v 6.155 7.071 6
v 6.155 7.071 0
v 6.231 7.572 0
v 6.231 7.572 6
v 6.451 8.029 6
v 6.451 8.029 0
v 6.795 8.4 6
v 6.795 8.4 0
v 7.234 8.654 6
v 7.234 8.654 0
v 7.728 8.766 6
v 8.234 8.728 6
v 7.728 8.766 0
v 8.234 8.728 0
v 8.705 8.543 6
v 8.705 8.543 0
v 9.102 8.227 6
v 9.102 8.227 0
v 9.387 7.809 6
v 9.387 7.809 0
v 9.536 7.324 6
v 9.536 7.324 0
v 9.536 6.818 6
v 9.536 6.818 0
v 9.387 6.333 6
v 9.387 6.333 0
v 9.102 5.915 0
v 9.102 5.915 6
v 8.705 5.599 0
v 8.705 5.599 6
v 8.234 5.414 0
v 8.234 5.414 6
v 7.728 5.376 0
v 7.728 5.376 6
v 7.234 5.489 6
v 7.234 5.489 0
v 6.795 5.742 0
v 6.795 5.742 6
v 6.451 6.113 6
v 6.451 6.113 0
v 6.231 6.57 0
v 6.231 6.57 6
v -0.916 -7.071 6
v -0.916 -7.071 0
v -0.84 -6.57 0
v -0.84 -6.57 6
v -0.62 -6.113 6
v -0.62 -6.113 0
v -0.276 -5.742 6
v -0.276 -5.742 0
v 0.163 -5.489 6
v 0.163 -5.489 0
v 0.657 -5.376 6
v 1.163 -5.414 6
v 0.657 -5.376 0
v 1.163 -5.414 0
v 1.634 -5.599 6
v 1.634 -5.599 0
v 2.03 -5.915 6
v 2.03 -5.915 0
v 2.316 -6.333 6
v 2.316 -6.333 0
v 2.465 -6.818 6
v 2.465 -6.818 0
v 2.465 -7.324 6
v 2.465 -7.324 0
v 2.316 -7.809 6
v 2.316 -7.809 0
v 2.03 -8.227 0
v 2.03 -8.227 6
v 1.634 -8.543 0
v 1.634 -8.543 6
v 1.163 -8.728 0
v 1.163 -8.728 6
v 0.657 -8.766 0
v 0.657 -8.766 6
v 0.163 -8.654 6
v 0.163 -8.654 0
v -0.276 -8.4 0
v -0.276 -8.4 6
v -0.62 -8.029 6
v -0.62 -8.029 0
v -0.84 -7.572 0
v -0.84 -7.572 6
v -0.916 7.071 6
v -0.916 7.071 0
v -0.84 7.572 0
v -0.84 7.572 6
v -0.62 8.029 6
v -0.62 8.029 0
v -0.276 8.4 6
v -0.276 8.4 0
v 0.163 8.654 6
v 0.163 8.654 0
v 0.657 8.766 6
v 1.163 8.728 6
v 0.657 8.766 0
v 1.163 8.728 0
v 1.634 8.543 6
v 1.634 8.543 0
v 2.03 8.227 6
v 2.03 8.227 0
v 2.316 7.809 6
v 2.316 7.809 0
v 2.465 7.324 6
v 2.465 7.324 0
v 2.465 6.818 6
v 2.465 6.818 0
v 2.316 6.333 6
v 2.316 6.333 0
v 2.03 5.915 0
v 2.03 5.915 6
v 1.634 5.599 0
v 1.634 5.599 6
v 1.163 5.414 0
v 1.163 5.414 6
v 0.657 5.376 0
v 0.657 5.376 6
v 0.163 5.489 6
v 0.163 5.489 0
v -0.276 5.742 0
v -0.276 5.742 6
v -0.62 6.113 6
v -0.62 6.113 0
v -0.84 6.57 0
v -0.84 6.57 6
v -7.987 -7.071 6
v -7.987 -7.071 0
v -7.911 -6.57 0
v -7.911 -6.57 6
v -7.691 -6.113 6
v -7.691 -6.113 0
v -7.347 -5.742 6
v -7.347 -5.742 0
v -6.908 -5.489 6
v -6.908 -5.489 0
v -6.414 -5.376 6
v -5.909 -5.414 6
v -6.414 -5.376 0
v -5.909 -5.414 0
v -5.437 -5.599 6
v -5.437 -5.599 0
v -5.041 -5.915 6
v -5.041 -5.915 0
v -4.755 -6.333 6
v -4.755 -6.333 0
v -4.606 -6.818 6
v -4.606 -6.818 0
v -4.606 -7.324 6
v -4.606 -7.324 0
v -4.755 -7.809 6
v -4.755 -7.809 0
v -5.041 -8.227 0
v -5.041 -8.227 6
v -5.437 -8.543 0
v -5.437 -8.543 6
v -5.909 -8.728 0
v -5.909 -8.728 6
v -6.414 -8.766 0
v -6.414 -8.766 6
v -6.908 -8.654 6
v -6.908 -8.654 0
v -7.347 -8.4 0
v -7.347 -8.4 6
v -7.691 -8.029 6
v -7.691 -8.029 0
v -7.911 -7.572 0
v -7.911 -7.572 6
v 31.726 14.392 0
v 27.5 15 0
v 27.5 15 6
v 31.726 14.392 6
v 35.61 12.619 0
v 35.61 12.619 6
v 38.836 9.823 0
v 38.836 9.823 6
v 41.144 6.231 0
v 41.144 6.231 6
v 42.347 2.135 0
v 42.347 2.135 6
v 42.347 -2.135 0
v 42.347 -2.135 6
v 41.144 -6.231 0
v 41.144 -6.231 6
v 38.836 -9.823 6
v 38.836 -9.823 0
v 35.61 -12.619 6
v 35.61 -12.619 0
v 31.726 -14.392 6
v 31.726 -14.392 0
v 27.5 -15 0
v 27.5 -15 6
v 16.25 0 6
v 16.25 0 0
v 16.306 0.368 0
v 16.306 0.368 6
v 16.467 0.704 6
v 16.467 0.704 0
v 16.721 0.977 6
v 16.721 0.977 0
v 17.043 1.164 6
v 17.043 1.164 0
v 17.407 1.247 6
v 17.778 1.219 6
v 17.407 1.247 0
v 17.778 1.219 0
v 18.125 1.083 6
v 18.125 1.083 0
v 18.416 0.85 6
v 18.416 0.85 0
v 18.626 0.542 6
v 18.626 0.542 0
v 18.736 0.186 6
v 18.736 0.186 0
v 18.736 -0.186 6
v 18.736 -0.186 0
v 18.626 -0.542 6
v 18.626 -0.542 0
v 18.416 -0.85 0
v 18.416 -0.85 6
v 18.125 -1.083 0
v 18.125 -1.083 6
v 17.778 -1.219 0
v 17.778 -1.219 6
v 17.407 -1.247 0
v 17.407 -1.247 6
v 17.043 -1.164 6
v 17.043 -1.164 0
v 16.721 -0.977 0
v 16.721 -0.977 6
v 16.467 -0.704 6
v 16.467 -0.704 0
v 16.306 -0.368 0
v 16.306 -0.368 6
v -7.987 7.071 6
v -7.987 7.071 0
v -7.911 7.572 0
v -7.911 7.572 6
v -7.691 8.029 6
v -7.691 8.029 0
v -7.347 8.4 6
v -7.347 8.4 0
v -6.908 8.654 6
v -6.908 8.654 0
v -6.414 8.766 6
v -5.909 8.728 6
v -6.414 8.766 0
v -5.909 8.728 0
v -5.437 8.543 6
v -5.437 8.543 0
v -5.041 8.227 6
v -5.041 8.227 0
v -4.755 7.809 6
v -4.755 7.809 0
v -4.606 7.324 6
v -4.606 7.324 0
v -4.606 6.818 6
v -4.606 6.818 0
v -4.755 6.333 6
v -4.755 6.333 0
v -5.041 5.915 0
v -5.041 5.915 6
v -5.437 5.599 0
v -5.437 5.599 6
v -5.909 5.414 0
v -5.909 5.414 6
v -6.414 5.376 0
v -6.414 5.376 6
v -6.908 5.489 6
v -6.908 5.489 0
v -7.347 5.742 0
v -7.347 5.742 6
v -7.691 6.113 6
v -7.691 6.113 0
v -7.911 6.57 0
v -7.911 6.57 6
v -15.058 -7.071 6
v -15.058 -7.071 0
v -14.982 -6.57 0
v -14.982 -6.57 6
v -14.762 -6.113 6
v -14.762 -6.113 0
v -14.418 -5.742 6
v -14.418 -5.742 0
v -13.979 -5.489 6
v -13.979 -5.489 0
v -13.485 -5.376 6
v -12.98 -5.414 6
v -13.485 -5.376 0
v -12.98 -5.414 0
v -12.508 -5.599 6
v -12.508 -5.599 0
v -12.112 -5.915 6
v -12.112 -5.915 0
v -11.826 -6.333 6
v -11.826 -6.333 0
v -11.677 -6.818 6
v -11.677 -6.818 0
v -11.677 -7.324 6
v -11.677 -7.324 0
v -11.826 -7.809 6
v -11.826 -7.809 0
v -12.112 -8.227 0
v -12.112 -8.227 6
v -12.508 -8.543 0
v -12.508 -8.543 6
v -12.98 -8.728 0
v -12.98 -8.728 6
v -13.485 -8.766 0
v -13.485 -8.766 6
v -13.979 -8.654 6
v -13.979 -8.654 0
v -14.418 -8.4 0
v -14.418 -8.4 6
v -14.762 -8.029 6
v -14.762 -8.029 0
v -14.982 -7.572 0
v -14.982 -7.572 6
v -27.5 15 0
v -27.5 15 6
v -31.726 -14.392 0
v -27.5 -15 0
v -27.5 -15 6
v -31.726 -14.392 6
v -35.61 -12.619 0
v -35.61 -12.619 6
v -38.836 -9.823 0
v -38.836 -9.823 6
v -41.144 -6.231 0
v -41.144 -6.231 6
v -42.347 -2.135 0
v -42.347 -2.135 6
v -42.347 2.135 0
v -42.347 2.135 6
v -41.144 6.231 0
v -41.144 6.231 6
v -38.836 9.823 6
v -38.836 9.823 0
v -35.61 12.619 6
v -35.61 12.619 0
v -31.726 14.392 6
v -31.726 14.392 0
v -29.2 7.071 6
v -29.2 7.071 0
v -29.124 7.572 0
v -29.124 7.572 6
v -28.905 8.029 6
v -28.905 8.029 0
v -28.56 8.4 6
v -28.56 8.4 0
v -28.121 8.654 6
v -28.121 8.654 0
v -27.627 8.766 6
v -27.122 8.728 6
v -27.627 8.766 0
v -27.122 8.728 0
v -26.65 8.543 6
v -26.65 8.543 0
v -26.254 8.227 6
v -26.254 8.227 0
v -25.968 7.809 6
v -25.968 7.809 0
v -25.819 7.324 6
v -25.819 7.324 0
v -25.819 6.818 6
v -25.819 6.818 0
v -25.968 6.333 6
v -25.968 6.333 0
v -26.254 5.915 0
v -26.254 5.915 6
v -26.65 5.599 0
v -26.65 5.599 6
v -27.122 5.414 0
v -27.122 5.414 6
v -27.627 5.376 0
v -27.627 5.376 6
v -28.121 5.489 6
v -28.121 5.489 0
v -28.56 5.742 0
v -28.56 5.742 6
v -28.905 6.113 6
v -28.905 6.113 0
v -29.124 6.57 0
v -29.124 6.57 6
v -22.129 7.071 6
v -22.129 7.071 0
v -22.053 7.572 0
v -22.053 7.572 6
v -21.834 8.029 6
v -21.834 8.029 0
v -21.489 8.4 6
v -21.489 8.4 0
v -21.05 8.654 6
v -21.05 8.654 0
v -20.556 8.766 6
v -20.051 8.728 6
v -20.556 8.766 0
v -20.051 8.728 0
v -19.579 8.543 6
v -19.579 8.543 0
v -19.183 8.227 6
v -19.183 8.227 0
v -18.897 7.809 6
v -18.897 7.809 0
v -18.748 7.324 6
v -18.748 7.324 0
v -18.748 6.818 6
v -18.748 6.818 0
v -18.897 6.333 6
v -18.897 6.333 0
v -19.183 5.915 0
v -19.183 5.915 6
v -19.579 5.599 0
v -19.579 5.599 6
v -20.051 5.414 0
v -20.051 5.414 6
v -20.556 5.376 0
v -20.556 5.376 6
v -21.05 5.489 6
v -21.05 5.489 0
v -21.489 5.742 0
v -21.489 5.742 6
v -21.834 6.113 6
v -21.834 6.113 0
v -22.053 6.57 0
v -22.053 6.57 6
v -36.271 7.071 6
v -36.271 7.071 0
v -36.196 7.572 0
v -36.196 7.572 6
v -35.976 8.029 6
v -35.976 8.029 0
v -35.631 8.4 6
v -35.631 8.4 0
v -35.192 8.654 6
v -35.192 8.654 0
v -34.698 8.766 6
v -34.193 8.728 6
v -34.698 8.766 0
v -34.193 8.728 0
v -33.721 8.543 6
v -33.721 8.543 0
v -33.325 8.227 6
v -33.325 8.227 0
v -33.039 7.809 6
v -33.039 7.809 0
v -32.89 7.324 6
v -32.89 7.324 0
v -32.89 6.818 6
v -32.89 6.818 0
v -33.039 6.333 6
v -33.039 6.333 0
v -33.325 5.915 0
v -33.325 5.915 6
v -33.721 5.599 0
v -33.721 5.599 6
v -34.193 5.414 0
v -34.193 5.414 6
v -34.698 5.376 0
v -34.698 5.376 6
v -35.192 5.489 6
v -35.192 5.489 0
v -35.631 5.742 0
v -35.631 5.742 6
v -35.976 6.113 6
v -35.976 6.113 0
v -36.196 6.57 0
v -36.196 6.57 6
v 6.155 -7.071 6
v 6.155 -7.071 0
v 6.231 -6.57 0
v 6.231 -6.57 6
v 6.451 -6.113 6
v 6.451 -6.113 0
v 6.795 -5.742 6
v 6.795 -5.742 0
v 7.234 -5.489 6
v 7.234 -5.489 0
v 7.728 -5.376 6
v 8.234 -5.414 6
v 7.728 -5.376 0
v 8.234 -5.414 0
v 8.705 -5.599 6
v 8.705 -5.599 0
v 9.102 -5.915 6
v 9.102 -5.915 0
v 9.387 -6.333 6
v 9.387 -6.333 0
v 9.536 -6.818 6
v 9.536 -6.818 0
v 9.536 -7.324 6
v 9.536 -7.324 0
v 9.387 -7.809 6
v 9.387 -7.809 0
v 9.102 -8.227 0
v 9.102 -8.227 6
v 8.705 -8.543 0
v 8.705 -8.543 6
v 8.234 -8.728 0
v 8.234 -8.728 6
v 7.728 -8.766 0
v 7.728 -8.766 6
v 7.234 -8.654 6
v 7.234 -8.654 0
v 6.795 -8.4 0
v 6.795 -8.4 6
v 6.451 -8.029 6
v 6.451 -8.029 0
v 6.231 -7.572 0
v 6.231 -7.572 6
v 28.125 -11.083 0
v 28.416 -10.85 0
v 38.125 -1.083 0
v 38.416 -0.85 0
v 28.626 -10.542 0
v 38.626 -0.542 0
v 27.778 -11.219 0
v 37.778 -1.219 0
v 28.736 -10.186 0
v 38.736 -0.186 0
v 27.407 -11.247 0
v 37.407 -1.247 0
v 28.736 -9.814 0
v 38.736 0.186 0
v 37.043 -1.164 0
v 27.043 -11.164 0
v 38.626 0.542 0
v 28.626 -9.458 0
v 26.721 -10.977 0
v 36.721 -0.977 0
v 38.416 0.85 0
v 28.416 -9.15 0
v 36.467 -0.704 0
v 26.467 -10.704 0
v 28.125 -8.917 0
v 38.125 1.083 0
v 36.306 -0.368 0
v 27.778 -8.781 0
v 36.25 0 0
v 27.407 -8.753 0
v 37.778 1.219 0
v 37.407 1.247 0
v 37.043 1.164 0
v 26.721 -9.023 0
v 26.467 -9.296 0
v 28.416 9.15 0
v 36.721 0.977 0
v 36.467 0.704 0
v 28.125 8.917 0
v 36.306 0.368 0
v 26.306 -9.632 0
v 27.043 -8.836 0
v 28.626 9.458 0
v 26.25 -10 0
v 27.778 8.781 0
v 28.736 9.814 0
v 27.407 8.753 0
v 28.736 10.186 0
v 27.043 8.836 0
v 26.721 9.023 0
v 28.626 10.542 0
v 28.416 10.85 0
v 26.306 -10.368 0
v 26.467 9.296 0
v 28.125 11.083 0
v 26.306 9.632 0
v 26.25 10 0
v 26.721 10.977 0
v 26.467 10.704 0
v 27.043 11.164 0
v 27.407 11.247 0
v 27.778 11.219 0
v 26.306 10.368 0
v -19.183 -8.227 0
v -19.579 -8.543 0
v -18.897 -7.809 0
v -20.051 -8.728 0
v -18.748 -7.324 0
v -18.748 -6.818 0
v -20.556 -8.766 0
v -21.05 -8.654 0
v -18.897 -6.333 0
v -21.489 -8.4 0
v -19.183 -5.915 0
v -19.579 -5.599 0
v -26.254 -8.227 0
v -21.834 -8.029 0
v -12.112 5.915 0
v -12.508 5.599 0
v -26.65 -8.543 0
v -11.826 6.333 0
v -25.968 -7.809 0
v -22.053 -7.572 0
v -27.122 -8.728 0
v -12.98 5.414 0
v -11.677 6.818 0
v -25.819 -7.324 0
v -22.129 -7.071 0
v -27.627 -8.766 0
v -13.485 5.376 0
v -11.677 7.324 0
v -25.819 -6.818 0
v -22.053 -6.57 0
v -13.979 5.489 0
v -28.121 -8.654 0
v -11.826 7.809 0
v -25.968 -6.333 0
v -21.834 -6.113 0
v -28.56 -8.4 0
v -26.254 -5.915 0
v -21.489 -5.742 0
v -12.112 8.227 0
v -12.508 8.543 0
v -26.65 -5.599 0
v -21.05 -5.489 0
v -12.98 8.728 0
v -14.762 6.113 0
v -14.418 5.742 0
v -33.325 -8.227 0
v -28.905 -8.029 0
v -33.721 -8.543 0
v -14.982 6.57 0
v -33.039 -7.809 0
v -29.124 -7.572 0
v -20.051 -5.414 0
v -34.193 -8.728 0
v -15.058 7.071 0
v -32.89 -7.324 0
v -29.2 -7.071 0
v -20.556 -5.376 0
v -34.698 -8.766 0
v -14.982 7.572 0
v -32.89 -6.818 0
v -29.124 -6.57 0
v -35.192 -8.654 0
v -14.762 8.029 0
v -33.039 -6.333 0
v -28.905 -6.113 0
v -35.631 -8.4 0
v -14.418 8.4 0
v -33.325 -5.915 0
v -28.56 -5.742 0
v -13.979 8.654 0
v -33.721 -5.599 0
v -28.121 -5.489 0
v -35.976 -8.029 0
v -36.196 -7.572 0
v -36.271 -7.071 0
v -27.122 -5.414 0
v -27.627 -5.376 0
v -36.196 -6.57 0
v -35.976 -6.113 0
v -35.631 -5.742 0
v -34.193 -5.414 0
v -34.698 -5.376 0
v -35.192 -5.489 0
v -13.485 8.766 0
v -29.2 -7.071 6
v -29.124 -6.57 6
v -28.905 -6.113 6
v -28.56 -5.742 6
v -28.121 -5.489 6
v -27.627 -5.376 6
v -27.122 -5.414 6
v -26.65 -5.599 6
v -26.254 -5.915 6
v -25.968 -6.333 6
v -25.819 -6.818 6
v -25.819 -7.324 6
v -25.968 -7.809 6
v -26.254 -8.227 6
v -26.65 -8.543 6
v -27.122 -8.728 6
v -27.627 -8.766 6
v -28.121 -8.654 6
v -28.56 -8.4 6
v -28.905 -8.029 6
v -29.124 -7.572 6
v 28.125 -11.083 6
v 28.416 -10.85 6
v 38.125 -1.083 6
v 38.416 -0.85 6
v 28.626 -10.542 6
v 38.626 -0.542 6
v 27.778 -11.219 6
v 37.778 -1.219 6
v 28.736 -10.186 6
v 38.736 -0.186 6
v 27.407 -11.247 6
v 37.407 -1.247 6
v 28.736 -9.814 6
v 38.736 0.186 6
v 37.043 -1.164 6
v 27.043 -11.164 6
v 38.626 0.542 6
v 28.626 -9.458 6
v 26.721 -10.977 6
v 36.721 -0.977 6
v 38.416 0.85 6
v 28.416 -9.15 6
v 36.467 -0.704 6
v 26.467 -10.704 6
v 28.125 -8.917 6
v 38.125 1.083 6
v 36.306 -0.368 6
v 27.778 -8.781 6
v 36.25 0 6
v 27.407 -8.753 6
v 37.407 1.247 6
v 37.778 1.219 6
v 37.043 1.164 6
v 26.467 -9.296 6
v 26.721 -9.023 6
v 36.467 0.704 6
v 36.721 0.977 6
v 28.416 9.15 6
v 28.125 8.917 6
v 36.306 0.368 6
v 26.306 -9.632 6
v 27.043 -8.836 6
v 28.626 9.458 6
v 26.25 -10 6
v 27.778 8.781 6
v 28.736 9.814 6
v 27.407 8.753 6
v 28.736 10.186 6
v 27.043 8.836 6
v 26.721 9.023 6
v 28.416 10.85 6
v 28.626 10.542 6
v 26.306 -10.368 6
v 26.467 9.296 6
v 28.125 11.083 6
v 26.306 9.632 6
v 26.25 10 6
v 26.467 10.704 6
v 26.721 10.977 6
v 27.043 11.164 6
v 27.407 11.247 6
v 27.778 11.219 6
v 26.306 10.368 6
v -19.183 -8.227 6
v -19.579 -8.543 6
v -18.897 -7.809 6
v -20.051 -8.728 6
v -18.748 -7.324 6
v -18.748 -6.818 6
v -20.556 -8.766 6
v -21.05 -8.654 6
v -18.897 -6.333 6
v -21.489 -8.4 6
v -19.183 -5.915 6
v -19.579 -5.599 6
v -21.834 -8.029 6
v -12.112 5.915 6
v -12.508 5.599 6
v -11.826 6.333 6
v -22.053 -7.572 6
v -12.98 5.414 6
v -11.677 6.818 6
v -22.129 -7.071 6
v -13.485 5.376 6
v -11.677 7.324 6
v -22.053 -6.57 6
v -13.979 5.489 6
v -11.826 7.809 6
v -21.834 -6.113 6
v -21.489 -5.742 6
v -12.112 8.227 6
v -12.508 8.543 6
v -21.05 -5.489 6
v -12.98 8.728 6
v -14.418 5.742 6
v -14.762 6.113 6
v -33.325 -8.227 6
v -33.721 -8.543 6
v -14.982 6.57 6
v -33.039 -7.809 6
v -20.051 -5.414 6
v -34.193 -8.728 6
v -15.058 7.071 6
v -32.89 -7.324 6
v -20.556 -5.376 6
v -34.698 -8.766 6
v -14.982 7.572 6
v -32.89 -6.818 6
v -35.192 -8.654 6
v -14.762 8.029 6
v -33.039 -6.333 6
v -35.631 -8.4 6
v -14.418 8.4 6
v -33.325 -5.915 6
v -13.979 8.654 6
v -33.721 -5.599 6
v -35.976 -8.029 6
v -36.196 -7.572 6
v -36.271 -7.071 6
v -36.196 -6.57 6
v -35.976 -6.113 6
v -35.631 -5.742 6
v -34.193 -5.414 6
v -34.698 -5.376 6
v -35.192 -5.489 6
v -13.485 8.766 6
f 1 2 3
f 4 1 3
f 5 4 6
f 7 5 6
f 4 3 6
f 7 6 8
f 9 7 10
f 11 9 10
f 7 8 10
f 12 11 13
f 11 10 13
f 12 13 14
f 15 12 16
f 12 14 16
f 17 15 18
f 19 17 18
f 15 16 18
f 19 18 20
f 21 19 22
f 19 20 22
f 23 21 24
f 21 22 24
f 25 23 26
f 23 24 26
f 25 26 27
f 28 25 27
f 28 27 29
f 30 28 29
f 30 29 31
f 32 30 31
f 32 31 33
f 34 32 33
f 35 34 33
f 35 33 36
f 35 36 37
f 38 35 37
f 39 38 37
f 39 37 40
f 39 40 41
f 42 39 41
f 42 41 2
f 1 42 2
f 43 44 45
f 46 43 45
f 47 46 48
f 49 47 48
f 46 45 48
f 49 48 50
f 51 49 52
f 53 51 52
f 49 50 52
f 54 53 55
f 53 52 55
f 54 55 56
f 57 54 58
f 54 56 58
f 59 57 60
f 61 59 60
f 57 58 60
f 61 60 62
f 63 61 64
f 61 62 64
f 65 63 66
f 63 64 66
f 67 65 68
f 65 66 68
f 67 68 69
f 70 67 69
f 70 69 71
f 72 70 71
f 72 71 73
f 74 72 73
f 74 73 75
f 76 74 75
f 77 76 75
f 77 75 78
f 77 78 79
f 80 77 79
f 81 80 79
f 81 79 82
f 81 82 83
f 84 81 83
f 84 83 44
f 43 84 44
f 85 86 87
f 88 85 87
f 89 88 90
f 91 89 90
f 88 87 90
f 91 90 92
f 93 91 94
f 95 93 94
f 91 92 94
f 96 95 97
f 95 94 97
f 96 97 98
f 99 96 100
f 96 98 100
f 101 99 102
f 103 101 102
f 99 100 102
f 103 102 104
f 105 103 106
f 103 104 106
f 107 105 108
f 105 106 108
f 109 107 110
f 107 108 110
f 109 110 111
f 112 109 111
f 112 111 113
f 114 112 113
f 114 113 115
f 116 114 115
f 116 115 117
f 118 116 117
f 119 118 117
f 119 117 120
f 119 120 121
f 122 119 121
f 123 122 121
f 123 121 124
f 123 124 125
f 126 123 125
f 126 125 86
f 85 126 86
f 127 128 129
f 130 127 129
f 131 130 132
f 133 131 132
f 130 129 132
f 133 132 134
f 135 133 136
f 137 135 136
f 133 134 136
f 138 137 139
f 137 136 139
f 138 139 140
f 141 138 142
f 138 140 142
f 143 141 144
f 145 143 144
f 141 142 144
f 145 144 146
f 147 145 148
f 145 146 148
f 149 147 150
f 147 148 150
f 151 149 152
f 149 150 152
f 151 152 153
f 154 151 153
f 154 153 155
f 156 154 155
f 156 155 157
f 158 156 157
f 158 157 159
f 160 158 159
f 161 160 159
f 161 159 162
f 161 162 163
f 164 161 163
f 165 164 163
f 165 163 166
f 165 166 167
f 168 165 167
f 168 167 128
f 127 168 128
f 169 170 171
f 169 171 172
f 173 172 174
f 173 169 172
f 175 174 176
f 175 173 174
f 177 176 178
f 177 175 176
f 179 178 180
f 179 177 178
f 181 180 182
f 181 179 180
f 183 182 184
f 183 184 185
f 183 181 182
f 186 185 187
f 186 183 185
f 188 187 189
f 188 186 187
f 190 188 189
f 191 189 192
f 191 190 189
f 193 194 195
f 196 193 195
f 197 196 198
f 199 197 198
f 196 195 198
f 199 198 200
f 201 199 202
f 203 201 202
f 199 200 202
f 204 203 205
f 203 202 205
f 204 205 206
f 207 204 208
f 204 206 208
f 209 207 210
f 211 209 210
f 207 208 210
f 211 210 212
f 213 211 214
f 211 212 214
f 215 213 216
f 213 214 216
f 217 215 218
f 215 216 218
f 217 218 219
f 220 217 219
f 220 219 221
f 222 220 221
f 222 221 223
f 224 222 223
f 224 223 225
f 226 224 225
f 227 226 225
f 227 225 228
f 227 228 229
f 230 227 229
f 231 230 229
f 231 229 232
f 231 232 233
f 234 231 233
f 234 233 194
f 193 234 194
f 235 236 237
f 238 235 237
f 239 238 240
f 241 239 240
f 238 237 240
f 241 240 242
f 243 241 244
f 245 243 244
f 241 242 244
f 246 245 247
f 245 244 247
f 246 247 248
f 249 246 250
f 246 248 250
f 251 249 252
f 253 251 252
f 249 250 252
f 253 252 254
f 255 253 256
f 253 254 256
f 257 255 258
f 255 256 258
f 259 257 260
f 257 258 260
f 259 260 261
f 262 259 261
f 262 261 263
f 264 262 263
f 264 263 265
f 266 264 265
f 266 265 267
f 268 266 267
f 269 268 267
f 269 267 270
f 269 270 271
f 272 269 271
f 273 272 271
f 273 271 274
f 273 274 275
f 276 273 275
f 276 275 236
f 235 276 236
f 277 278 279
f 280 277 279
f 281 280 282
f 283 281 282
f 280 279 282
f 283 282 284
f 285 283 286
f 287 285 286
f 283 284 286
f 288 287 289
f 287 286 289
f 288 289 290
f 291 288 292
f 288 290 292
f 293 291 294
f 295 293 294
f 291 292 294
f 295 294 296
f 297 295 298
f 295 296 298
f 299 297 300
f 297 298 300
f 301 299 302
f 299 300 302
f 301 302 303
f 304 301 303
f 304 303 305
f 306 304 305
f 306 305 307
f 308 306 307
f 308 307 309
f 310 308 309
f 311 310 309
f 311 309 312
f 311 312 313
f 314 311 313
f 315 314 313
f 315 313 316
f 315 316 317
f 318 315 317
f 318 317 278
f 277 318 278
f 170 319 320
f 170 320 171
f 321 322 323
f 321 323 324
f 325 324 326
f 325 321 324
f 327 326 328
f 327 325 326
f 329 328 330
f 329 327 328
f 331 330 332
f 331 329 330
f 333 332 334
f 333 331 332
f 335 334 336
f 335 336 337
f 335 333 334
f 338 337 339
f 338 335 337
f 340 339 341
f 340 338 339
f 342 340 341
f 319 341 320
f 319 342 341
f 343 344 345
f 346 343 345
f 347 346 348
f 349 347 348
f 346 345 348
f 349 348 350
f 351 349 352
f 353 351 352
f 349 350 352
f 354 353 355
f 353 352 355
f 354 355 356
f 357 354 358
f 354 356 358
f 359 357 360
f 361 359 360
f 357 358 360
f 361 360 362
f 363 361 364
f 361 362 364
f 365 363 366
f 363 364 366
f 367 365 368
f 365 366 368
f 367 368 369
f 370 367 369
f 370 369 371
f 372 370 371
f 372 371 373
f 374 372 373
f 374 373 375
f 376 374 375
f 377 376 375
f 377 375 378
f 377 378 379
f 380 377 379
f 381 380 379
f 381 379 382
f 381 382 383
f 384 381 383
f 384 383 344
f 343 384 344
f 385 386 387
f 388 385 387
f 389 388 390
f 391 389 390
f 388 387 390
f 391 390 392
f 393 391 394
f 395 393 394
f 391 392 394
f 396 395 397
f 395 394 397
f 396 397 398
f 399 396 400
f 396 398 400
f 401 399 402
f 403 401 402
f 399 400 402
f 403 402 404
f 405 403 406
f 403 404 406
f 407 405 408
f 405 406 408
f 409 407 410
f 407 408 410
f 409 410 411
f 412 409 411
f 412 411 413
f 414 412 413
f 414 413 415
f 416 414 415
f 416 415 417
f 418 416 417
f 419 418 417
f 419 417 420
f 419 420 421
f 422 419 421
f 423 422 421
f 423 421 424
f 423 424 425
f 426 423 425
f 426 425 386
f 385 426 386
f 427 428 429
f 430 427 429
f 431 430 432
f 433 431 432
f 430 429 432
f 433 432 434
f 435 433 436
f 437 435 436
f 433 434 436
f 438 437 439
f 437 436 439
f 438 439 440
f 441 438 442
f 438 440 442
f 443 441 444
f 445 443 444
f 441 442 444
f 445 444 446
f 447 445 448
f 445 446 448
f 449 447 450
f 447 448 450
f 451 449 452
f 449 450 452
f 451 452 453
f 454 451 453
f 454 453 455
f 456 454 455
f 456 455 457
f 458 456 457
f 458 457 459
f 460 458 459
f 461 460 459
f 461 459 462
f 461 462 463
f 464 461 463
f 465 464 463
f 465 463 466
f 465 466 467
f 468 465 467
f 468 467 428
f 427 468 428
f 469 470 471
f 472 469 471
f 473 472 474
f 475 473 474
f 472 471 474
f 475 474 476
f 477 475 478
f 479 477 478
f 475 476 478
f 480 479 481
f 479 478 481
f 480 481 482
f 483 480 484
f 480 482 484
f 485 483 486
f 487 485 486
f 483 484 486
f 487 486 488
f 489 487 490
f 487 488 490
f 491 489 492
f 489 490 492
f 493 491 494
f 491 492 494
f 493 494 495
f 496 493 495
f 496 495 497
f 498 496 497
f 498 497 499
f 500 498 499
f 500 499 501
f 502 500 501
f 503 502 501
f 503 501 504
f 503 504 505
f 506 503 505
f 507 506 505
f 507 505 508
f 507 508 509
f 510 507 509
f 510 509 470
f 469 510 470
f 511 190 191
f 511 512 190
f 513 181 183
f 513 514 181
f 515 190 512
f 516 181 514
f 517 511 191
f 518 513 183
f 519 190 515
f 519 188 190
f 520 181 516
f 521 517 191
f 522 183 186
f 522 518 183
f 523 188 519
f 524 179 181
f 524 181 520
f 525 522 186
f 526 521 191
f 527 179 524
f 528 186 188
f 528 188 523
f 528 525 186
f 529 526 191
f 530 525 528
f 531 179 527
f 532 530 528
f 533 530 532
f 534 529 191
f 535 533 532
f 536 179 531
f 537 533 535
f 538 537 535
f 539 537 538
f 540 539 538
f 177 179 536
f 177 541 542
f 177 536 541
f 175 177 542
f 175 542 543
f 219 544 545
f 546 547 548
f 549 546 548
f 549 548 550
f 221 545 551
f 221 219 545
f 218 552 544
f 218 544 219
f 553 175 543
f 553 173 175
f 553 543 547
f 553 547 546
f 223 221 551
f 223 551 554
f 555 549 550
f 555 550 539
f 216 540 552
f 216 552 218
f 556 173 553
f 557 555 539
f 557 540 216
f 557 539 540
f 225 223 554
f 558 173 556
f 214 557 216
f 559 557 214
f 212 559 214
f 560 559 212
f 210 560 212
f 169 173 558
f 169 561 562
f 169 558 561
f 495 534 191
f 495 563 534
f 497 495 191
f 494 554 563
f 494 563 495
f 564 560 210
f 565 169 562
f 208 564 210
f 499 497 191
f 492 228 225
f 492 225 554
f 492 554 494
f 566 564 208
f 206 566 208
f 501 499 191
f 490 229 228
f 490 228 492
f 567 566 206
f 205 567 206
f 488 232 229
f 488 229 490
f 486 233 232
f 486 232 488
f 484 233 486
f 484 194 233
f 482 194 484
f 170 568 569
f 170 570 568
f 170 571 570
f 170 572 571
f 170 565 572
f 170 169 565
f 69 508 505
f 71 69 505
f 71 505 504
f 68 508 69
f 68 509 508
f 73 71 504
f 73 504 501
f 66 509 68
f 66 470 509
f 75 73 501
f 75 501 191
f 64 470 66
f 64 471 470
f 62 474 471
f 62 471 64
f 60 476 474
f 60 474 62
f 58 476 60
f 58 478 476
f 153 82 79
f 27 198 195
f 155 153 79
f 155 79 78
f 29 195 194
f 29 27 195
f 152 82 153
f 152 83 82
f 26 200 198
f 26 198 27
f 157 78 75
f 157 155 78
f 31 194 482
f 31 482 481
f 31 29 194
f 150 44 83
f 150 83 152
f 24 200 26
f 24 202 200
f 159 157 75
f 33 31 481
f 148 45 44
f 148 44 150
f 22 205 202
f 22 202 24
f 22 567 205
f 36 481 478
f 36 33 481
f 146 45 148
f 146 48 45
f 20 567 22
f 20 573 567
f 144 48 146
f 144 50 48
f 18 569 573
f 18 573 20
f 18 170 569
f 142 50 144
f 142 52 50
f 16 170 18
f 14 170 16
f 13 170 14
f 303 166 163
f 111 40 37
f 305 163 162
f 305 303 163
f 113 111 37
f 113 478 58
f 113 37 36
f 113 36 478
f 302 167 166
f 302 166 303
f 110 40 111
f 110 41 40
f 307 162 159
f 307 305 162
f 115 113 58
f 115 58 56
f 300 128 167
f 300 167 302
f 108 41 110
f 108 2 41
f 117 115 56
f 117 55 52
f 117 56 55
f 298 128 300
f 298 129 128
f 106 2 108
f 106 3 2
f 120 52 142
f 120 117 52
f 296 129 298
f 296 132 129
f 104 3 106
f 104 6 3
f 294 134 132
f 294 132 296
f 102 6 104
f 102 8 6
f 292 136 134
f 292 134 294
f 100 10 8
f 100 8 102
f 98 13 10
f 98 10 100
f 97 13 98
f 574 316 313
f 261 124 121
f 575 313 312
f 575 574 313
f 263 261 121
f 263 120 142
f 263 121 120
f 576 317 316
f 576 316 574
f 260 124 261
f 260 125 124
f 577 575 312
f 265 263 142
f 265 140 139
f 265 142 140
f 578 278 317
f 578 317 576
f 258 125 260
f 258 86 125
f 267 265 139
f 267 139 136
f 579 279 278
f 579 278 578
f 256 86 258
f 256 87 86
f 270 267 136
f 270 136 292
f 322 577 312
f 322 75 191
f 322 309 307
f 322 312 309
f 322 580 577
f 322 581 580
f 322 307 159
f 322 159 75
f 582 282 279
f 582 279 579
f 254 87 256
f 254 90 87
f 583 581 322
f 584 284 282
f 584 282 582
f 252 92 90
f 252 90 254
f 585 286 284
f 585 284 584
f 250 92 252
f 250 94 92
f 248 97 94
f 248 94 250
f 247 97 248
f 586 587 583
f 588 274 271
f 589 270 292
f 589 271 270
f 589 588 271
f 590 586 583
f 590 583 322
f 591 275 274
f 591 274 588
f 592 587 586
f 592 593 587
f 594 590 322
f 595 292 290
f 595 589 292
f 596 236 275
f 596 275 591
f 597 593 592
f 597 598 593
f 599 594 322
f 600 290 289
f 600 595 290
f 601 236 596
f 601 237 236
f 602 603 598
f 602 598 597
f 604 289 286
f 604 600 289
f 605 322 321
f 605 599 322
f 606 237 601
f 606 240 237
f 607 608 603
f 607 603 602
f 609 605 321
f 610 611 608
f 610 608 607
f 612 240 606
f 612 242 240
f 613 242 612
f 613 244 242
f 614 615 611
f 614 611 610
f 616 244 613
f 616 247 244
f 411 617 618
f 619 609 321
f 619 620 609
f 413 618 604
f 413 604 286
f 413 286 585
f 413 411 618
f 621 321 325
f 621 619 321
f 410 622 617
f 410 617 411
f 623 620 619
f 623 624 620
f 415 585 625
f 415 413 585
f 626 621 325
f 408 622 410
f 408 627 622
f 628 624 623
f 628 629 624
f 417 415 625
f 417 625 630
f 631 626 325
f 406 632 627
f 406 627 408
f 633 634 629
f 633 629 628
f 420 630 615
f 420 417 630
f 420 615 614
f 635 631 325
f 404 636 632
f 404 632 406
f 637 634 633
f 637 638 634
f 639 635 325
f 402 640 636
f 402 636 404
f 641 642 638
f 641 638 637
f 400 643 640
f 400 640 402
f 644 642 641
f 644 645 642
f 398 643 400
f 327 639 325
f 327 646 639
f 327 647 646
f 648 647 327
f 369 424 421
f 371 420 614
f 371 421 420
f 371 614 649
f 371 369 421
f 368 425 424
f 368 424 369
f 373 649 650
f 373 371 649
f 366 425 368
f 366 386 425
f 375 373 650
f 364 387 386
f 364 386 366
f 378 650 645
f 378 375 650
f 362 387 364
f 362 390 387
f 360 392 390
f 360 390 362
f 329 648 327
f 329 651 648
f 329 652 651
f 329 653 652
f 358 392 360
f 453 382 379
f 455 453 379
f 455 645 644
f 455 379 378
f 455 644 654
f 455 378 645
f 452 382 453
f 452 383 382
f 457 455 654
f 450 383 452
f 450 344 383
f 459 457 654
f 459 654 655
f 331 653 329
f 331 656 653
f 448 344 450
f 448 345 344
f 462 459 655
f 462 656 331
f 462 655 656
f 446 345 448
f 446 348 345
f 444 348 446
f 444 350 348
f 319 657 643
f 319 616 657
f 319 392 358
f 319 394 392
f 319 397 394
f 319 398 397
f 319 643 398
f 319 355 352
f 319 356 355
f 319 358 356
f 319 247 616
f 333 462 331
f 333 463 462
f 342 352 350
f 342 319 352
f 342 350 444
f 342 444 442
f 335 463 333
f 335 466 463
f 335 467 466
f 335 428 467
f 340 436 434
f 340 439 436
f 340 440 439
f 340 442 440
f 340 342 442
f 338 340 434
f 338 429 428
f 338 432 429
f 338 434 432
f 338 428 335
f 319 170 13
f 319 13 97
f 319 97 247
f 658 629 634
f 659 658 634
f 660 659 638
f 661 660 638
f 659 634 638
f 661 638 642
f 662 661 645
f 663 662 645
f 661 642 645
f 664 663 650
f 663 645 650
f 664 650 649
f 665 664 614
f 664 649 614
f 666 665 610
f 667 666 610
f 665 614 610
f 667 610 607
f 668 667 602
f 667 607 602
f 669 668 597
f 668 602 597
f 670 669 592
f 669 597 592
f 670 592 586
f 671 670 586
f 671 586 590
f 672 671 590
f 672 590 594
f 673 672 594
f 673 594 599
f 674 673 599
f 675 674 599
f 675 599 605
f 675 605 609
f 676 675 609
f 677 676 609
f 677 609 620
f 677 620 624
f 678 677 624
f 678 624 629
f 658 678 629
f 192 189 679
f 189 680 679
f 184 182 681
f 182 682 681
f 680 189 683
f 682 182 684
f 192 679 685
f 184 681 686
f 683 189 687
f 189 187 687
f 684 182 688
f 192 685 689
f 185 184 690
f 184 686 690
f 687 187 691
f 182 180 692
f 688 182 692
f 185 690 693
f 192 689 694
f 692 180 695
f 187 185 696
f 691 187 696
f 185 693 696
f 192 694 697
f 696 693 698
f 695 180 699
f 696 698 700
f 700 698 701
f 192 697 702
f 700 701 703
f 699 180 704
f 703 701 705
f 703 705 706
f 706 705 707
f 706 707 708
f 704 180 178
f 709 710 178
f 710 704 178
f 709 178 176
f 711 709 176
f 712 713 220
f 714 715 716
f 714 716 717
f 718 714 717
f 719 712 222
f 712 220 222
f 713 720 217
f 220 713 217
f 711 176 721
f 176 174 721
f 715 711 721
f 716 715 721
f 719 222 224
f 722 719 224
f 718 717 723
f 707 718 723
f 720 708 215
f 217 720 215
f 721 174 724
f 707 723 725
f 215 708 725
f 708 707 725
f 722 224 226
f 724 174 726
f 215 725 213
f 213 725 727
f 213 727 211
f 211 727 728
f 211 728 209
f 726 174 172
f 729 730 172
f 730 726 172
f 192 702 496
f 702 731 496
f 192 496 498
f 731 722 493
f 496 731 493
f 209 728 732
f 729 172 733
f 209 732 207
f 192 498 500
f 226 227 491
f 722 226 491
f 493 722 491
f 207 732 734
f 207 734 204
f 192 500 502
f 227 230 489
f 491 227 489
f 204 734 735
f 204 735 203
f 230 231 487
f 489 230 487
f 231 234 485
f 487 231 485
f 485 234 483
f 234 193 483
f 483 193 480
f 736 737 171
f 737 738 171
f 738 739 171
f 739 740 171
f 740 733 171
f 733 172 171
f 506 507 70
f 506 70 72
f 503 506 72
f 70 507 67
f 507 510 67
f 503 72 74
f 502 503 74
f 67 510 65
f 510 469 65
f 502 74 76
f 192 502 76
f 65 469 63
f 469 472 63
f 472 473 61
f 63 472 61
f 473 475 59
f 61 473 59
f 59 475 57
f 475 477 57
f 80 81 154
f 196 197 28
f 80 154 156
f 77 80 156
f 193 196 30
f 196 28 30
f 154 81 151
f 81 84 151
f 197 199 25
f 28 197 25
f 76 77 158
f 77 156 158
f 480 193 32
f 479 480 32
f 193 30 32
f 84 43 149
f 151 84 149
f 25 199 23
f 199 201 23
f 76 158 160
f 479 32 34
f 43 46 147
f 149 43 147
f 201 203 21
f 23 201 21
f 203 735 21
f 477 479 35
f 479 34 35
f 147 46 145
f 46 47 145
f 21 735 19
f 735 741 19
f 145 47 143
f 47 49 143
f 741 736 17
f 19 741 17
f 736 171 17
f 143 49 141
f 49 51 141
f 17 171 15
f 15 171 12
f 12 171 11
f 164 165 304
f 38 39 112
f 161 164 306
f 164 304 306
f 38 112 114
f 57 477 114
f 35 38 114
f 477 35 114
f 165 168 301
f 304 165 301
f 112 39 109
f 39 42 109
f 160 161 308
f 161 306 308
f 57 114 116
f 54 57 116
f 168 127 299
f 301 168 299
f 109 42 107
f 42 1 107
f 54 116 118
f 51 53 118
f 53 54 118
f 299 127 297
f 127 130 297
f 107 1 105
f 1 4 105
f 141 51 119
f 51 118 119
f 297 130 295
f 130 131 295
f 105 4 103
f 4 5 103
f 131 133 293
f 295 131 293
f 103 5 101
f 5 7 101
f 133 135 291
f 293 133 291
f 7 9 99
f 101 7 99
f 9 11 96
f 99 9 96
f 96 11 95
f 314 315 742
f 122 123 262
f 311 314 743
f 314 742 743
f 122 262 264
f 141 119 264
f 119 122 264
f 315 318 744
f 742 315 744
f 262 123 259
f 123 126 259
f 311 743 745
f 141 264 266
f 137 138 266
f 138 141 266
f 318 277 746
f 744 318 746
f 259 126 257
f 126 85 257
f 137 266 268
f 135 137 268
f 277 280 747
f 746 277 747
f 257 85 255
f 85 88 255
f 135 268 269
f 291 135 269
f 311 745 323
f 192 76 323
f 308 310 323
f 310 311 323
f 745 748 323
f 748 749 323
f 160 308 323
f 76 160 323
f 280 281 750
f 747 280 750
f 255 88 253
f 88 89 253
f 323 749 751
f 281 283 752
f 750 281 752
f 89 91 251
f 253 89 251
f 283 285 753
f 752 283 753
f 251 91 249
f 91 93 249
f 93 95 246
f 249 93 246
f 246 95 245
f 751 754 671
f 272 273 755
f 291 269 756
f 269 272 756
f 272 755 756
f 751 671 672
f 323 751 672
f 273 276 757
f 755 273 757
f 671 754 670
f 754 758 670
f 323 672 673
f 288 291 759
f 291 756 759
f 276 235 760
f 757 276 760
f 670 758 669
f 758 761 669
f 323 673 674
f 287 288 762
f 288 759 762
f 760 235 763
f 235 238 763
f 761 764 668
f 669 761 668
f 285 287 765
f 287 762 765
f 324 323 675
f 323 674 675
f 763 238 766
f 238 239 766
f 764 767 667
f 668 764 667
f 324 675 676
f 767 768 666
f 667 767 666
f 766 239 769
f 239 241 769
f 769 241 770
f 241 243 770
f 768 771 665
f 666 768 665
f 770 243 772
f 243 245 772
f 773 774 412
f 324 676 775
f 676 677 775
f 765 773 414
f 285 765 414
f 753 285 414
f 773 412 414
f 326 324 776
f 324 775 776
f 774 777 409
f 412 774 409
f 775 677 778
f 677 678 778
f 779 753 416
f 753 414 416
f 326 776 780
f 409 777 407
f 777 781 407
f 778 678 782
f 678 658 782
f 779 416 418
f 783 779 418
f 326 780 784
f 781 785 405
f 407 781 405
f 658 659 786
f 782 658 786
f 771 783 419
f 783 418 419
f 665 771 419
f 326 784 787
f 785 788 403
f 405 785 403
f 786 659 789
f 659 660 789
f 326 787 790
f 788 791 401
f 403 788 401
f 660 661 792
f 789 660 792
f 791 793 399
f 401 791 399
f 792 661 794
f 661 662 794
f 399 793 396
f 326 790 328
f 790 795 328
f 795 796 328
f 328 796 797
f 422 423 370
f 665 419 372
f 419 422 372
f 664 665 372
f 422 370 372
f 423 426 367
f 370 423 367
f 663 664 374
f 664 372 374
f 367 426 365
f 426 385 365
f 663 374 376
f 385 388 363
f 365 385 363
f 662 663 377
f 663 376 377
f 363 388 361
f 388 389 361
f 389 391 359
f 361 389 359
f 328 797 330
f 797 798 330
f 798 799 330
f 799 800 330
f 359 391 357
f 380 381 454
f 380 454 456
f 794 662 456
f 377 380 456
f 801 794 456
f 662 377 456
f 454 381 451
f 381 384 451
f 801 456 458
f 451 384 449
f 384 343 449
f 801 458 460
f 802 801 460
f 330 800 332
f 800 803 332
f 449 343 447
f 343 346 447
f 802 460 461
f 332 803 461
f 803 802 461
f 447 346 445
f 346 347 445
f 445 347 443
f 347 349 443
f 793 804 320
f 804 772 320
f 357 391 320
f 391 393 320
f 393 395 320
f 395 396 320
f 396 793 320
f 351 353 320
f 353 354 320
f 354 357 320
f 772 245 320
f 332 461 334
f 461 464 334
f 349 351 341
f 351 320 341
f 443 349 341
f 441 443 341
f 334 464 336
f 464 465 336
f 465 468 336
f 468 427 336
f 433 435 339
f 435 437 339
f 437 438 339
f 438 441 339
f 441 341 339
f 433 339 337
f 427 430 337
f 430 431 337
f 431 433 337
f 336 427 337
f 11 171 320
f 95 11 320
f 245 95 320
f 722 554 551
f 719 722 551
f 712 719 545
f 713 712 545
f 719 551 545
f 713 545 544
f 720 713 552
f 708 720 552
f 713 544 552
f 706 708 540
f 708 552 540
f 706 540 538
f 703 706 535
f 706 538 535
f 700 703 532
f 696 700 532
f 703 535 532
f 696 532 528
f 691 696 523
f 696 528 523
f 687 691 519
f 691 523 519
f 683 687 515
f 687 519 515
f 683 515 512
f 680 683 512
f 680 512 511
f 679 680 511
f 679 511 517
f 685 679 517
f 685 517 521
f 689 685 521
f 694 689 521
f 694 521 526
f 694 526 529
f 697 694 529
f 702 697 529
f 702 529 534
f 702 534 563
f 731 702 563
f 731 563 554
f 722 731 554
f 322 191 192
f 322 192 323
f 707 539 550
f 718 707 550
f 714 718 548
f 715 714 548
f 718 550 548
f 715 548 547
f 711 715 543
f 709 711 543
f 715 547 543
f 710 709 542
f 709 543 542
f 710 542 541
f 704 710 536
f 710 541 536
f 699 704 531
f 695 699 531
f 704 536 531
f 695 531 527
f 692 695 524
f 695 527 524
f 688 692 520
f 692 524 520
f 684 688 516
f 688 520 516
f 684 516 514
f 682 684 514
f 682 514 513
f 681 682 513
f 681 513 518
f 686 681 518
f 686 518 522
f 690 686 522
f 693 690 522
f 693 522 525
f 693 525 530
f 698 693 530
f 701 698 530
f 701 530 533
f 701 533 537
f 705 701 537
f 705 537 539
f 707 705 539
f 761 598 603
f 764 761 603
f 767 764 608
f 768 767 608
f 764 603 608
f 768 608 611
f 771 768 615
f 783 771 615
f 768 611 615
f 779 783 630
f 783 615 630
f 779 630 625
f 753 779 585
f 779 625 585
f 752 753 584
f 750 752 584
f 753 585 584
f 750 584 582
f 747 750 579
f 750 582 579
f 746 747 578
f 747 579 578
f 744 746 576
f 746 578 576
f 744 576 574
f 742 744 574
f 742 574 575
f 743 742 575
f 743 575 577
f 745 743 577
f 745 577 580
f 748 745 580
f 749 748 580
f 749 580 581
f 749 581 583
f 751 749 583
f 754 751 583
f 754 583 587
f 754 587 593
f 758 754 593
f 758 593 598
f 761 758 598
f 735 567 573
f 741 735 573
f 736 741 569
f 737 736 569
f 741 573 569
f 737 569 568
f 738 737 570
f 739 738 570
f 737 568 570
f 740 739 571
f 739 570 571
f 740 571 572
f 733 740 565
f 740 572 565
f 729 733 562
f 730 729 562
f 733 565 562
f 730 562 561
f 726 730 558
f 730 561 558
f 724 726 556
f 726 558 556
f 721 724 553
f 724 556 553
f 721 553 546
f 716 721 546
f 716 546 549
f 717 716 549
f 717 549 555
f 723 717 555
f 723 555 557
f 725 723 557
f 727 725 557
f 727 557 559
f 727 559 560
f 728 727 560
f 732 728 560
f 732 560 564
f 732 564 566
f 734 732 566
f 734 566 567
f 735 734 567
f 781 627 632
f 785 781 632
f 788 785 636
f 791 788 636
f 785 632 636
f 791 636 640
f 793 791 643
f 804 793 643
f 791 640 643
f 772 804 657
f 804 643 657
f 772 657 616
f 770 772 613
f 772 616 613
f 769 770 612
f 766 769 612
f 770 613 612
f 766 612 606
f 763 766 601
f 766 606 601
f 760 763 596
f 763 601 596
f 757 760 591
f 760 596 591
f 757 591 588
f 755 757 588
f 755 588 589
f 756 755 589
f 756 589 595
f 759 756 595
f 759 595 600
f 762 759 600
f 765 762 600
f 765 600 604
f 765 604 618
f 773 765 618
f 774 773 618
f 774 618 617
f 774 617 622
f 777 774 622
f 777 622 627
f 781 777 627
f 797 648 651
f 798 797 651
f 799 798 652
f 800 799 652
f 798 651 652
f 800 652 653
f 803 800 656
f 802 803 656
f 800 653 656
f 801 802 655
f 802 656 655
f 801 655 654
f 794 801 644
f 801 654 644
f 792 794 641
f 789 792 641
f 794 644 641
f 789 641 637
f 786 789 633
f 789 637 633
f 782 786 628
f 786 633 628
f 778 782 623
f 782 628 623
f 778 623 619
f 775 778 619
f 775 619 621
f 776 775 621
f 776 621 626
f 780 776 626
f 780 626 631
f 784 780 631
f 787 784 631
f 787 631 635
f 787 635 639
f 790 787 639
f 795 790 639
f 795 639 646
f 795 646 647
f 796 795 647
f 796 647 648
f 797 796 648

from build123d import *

# Parameters (mm, degrees)
EXTRUDE_1_DEPTH   = 6
M3X0_51_D         = 2.5
HOLE_WIZARD_M31_D = 3.4


with BuildPart() as part:
    # Эскиз1 → Бобышка-Вытянуть1 (new body)
    with BuildSketch(Plane.XY):
        with BuildLine():
            Line((-27.5, 15), (27.5, 15))
            ThreePointArc((27.5, 15), (42.5, 0), (27.5, -15))
            Line((27.5, -15), (-27.5, -15))
            ThreePointArc((-27.5, -15), (-42.5, 0), (-27.5, 15))
        make_face()
    extrude(amount=EXTRUDE_1_DEPTH)

    # Отверстие обработанное метчиком M3x0.51 (through all)
    with Locations(Plane.XY.offset(6)):
        with Locations((27.5, 10), (37.5, 0), (27.5, -10), (17.5, 0)):
            Hole(M3X0_51_D / 2)

    # Отверстие с зазором M31 (through all)
    with Locations(Plane.XY.offset(6)):
        with Locations((-34.571067812, 7.071067812), (-20.428932188, 7.071067812), (-6.286796564, 7.071067812), (7.855339059, 7.071067812), (7.855339059, -7.071067812), (-6.286796564, -7.071067812), (-20.428932188, -7.071067812), (-34.571067812, -7.071067812), (-27.5, -7.071067812), (-27.5, 7.071067812), (-13.357864376, 7.071067812), (-13.357864376, -7.071067812), (0.784271247, -7.071067812), (0.784271247, 7.071067812)):
            Hole(HOLE_WIZARD_M31_D / 2)


solid = part.part
